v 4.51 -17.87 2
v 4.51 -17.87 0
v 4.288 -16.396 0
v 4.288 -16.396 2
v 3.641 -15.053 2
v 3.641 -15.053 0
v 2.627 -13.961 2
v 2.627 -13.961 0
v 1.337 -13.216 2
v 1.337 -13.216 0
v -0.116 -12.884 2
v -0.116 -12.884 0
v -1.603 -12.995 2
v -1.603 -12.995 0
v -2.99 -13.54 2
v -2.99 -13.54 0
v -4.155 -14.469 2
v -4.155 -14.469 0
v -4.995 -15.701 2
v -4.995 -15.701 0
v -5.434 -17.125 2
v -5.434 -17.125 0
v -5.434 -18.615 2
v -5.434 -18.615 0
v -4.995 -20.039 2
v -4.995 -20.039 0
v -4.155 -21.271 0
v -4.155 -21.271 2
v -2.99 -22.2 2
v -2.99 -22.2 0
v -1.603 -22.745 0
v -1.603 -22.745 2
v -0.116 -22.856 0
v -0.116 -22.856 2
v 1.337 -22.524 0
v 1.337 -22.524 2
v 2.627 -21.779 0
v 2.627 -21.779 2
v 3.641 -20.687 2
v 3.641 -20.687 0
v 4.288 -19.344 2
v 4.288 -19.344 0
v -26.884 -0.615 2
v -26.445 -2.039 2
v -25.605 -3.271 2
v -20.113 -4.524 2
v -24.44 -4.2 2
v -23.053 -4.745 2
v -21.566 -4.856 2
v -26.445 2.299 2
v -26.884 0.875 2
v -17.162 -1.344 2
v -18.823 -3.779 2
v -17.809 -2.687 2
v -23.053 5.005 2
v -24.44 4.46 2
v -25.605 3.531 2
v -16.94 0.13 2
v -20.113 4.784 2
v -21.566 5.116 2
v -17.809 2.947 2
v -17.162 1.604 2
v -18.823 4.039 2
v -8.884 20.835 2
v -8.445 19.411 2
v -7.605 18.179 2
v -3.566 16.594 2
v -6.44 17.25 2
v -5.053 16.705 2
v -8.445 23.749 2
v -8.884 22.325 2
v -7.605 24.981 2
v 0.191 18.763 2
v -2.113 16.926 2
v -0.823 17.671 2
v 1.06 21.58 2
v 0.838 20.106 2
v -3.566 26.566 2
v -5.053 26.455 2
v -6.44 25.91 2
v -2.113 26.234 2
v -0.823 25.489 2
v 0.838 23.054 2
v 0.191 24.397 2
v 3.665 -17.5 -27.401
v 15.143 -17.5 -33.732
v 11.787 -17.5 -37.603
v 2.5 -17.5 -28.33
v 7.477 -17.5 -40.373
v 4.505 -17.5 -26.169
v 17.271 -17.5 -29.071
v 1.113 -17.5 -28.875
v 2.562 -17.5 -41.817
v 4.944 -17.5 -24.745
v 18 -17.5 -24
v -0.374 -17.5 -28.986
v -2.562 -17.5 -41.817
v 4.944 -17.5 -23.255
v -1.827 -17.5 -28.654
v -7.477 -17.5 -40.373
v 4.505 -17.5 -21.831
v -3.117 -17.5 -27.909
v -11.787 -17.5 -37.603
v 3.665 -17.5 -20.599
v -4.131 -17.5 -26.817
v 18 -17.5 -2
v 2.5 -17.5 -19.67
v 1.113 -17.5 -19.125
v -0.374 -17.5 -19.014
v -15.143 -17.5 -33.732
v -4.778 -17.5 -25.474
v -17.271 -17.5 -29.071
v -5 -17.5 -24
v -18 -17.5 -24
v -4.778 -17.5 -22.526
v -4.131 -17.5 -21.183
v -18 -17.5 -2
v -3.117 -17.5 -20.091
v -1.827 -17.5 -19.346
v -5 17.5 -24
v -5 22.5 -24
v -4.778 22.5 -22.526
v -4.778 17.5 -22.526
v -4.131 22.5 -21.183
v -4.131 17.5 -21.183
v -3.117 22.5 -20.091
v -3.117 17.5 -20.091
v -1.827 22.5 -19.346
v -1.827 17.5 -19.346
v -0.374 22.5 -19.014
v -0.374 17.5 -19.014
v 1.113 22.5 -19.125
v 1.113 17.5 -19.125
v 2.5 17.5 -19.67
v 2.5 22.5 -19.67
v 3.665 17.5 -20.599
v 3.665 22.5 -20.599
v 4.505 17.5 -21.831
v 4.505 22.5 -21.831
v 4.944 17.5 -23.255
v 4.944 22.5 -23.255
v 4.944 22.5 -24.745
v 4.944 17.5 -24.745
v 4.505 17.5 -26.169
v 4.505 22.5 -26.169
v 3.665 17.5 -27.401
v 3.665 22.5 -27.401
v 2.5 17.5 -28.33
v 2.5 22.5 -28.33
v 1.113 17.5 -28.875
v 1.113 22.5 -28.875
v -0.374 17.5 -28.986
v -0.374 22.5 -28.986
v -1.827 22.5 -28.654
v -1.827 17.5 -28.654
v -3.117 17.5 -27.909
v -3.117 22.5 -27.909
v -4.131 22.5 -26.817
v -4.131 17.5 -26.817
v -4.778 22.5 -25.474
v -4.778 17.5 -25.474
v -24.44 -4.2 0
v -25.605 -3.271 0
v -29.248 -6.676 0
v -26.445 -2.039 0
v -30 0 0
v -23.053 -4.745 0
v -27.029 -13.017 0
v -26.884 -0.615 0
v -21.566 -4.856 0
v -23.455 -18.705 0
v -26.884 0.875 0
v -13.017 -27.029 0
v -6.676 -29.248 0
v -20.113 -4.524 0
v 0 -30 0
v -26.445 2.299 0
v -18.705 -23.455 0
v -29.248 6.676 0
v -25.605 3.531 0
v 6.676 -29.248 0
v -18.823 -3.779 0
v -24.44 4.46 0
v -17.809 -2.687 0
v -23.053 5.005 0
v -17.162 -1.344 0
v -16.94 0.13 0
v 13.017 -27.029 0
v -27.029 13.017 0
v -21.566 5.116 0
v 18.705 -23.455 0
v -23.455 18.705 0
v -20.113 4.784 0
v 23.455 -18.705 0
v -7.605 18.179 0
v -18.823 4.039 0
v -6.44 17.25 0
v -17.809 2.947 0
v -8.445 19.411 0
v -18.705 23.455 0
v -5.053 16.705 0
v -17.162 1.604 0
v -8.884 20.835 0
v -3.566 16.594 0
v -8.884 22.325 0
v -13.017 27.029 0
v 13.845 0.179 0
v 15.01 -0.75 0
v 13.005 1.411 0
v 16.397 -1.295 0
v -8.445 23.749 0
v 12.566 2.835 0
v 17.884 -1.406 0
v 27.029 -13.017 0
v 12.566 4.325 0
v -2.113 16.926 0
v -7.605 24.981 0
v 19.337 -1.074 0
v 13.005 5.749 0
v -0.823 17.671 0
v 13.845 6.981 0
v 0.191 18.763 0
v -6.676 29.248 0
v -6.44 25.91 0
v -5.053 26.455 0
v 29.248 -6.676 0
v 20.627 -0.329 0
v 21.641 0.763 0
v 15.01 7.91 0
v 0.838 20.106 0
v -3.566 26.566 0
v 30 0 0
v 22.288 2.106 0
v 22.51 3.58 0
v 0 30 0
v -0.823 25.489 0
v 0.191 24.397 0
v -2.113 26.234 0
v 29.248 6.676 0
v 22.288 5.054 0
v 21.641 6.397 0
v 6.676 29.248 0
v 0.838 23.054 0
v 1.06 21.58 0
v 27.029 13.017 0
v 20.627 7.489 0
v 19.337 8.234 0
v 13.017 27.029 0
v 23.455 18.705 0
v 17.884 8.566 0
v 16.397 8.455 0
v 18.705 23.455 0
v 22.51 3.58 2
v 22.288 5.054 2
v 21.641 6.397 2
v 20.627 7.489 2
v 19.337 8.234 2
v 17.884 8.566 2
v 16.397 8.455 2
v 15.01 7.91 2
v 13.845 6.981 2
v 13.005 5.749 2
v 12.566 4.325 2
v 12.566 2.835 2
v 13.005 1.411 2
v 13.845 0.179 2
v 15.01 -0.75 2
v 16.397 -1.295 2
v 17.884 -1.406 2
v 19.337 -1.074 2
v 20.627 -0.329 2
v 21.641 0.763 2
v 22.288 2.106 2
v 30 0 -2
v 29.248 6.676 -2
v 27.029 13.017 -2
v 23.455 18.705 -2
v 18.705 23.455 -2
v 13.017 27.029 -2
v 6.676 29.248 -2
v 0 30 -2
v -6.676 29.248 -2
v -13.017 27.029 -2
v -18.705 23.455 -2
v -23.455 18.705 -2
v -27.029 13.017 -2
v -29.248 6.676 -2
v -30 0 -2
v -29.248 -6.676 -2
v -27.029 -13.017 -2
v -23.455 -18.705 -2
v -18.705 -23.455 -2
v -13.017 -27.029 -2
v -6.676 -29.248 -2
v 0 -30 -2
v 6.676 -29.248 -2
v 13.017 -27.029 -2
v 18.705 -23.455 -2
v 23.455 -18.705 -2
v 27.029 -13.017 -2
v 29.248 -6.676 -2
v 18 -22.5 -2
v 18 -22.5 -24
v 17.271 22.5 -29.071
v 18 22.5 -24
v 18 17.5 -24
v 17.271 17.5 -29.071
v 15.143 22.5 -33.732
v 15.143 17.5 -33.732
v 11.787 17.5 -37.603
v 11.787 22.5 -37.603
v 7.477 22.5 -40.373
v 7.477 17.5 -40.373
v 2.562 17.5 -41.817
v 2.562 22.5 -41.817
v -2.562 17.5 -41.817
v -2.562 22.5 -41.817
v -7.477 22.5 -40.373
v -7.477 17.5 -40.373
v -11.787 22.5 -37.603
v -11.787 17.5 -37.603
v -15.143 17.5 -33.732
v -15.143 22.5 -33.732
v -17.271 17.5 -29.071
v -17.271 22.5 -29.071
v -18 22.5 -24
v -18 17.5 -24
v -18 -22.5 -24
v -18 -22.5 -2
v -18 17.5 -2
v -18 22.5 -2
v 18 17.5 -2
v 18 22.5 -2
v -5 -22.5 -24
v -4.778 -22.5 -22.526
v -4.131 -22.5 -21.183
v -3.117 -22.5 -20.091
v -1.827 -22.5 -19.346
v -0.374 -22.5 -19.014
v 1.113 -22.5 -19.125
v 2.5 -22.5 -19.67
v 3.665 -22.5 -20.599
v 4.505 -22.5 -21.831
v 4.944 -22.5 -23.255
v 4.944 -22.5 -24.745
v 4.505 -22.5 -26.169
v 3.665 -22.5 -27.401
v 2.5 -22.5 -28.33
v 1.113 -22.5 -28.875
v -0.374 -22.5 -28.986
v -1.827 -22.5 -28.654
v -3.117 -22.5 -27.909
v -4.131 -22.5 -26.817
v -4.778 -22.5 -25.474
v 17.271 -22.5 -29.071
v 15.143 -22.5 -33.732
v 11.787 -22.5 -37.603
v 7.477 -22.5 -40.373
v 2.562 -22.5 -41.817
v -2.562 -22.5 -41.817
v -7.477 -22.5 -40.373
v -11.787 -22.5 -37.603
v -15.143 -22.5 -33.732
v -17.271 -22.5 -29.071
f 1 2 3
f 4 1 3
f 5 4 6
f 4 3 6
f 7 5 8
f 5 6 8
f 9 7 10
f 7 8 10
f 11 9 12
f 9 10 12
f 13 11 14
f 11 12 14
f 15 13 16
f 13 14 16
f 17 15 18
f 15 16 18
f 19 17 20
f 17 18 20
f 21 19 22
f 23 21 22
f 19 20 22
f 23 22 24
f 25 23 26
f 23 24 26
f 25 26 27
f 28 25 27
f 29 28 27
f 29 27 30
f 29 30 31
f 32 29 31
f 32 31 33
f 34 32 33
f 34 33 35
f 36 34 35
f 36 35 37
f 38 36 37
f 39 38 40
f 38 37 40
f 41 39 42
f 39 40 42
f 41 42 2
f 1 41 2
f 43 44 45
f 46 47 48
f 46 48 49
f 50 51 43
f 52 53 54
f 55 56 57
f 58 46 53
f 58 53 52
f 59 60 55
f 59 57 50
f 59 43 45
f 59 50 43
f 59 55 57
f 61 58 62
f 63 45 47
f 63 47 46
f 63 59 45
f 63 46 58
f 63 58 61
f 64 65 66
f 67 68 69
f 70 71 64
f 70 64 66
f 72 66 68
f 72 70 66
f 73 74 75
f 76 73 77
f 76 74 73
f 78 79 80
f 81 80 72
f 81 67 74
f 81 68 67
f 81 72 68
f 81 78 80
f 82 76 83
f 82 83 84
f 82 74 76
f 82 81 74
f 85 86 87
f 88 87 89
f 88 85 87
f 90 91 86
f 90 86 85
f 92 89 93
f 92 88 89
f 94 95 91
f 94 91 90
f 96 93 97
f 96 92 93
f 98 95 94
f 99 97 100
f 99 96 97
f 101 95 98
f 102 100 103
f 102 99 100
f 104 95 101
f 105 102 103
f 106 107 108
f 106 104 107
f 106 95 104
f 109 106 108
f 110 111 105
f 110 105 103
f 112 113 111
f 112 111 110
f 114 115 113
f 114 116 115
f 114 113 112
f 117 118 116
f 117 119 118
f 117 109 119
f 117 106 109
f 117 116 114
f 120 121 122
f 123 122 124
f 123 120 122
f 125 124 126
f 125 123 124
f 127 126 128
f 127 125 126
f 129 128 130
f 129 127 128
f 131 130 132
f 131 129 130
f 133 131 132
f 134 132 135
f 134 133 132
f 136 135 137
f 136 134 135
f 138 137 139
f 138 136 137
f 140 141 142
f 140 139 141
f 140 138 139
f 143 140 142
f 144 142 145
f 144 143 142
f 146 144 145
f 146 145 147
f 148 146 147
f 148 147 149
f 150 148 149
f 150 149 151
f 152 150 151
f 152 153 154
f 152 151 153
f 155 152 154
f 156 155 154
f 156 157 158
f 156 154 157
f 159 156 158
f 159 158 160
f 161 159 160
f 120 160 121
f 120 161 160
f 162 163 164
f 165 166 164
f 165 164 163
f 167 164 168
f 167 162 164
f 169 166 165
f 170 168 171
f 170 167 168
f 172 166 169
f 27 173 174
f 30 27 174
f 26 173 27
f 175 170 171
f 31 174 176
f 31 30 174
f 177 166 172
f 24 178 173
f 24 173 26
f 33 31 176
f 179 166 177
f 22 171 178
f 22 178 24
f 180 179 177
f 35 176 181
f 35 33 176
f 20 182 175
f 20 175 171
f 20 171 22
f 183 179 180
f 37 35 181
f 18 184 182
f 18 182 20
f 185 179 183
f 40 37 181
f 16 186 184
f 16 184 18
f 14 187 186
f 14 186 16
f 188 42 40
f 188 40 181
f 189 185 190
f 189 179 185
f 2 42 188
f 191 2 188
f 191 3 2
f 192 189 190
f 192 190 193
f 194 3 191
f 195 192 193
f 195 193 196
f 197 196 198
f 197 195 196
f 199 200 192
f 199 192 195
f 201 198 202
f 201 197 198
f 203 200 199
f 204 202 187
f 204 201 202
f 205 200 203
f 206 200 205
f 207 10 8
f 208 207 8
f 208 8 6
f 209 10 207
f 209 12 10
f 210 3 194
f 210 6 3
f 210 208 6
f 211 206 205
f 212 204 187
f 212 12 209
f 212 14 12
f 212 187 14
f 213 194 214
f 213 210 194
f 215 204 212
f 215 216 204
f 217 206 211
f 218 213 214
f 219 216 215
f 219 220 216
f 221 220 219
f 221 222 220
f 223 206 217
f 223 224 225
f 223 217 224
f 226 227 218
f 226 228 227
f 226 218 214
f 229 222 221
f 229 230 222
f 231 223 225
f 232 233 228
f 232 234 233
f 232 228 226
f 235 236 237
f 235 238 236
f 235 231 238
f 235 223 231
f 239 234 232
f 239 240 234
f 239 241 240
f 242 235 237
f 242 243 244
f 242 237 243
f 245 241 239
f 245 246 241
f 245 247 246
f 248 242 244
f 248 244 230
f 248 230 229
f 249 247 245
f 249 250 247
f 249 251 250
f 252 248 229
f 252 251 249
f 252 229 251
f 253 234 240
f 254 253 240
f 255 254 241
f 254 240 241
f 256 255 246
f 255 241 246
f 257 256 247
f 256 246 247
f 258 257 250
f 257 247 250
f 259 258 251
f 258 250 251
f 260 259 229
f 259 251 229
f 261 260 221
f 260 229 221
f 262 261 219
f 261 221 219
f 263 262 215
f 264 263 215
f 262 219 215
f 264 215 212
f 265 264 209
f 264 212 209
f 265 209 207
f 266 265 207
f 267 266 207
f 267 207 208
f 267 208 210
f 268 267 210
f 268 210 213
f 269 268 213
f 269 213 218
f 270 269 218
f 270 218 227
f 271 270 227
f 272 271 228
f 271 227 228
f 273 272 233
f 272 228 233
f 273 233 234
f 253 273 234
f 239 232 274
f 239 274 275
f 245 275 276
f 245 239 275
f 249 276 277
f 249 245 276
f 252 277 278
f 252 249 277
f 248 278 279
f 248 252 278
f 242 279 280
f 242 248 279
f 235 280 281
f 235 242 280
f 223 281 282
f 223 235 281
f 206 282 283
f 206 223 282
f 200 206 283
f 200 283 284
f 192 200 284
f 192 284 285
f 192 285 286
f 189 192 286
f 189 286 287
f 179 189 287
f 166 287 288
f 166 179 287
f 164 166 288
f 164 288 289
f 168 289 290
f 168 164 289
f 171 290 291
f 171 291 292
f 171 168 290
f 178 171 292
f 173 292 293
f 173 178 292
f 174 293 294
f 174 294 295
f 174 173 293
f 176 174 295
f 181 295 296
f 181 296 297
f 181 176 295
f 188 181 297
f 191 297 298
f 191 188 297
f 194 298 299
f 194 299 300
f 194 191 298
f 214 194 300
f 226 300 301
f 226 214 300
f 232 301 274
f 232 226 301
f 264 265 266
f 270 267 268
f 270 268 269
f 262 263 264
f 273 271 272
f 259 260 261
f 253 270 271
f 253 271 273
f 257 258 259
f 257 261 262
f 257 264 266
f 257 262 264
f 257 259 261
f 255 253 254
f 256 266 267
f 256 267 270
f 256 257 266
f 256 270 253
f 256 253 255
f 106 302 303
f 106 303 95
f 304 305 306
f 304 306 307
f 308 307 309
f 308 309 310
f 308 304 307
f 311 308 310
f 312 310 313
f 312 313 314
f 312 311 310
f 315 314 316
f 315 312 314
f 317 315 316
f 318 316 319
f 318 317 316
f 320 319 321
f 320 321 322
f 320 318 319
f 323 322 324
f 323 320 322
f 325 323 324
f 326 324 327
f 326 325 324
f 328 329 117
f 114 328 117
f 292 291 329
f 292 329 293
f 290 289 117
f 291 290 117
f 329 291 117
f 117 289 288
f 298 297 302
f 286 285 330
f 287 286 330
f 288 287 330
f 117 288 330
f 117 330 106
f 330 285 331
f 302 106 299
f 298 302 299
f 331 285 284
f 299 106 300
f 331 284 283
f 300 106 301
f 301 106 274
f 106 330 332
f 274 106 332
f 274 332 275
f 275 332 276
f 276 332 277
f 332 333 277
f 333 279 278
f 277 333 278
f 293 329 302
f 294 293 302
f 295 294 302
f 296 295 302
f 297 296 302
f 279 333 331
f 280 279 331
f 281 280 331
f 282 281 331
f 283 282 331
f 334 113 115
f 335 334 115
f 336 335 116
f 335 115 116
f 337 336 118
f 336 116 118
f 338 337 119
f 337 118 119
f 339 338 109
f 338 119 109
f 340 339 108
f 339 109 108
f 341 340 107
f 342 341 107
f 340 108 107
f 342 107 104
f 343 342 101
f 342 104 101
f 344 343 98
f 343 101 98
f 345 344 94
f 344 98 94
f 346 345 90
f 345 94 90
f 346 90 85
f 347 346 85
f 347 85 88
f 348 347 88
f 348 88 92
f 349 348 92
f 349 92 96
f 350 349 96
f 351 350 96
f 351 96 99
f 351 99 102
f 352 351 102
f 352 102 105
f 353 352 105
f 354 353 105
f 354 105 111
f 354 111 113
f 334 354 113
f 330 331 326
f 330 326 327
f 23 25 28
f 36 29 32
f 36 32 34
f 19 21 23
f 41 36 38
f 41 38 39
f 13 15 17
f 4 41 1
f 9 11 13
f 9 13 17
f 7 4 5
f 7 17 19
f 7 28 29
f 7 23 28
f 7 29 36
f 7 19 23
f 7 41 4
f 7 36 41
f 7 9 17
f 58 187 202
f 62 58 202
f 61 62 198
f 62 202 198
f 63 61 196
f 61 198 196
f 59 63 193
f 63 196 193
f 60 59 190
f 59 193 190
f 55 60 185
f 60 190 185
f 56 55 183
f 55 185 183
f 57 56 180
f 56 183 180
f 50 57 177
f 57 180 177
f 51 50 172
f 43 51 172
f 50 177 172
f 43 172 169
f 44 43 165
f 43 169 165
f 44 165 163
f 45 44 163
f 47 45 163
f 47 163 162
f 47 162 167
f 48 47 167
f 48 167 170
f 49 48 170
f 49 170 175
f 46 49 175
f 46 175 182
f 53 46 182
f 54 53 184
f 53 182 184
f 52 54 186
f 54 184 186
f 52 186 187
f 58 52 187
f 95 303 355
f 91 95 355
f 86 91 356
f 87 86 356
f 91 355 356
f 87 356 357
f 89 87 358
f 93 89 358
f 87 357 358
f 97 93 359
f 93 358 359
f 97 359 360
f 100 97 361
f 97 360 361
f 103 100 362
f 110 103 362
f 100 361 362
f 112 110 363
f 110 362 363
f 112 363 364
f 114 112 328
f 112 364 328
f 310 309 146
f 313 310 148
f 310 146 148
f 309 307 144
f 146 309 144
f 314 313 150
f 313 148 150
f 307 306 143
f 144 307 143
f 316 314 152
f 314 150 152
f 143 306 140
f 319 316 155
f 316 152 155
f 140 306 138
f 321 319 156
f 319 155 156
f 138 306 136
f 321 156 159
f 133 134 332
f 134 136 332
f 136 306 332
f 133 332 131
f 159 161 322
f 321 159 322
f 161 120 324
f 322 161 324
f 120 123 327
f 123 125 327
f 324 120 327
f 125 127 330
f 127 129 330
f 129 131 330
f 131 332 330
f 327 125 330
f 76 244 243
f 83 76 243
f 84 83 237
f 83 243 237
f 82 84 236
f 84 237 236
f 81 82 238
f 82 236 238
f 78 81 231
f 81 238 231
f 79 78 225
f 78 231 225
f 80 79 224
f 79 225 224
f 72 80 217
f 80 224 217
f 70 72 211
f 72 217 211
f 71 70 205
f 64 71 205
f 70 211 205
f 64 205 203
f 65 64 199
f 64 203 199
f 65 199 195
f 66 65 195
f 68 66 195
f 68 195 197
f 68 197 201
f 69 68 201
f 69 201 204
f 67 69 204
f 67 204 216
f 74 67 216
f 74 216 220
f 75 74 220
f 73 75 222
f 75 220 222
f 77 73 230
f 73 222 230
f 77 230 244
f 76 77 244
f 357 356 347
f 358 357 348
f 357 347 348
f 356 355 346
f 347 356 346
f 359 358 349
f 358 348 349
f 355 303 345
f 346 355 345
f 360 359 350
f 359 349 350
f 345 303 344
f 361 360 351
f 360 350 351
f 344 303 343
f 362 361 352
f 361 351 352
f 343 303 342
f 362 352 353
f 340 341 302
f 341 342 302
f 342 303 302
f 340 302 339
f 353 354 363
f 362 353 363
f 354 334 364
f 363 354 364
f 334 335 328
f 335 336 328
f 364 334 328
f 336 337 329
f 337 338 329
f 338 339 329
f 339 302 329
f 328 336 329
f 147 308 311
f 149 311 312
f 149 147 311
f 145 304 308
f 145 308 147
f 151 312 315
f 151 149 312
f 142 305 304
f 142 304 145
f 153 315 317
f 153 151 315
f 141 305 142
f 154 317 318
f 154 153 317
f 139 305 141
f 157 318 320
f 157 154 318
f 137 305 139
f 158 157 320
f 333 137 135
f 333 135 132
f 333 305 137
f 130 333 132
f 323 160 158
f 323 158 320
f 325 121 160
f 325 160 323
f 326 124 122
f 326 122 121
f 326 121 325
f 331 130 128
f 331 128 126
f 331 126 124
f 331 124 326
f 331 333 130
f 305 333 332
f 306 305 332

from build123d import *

# Parameters (mm, degrees)
SKETCH1_R           = 30
BOSS_EXTRUDE1_DEPTH = 2
SKETCH3_W           = 36
SKETCH3_H           = 5
BOSS_EXTRUDE3_DEPTH = 22
BOSS_EXTRUDE4_DEPTH = 5
SKETCH6_R           = 5
CUT_EXTRUDE1_DEPTH  = 22
SKETCH7_R           = 5
BOSS_EXTRUDE5_DEPTH = 2


with BuildPart() as part:
    # Sketch1 → Boss-Extrude1 (new body)
    with BuildSketch(Plane.XY):
        Circle(SKETCH1_R)
    extrude(amount=-BOSS_EXTRUDE1_DEPTH)

    # Sketch3 → Boss-Extrude3 (add)
    with BuildSketch(Plane(origin=(0, 0, -2), x_dir=(-1, 0, 0), z_dir=(0, 0, -1))):
        with Locations((0, -20)):
            Rectangle(SKETCH3_W, SKETCH3_H)
    boss_extrude3 = extrude(amount=BOSS_EXTRUDE3_DEPTH)

    # Sketch5 → Boss-Extrude4 (add)
    with BuildSketch(Plane.XZ.offset(22.5)):
        with BuildLine():
            Line((-18, -24), (18, -24))
            ThreePointArc((18, -24), (0, -42), (-18, -24))
        make_face()
    boss_extrude4 = extrude(amount=-BOSS_EXTRUDE4_DEPTH)

    # Sketch6 → Cut-Extrude1 (cut)
    with BuildSketch(Plane(origin=(0, -17.5, 0), x_dir=(1, 0, 0), z_dir=(0, 1, 0))):
        with Locations(Location((0, 24, 0), (0, 0, 180))):
            Circle(SKETCH6_R)
    cut_extrude1 = extrude(amount=-CUT_EXTRUDE1_DEPTH, mode=Mode.SUBTRACT)

    # Mirror2: Boss-Extrude3, Boss-Extrude4, Cut-Extrude1 across plane
    add(boss_extrude3.mirror(Plane.ZX))
    add(boss_extrude4.mirror(Plane.ZX))
    add(cut_extrude1.mirror(Plane.ZX), mode=Mode.SUBTRACT)

    # Sketch7 → Boss-Extrude5 (add)
    with BuildSketch(Plane.XY):
        with Locations((-3.94, 21.58)):
            Circle(SKETCH7_R)
        with Locations((-21.94, 0.13)):
            Circle(SKETCH7_R)
        with Locations((-0.49, -17.87)):
            Circle(SKETCH7_R)
        with Locations((17.51, 3.58)):
            Circle(SKETCH7_R)
    extrude(amount=BOSS_EXTRUDE5_DEPTH)


solid = part.part
